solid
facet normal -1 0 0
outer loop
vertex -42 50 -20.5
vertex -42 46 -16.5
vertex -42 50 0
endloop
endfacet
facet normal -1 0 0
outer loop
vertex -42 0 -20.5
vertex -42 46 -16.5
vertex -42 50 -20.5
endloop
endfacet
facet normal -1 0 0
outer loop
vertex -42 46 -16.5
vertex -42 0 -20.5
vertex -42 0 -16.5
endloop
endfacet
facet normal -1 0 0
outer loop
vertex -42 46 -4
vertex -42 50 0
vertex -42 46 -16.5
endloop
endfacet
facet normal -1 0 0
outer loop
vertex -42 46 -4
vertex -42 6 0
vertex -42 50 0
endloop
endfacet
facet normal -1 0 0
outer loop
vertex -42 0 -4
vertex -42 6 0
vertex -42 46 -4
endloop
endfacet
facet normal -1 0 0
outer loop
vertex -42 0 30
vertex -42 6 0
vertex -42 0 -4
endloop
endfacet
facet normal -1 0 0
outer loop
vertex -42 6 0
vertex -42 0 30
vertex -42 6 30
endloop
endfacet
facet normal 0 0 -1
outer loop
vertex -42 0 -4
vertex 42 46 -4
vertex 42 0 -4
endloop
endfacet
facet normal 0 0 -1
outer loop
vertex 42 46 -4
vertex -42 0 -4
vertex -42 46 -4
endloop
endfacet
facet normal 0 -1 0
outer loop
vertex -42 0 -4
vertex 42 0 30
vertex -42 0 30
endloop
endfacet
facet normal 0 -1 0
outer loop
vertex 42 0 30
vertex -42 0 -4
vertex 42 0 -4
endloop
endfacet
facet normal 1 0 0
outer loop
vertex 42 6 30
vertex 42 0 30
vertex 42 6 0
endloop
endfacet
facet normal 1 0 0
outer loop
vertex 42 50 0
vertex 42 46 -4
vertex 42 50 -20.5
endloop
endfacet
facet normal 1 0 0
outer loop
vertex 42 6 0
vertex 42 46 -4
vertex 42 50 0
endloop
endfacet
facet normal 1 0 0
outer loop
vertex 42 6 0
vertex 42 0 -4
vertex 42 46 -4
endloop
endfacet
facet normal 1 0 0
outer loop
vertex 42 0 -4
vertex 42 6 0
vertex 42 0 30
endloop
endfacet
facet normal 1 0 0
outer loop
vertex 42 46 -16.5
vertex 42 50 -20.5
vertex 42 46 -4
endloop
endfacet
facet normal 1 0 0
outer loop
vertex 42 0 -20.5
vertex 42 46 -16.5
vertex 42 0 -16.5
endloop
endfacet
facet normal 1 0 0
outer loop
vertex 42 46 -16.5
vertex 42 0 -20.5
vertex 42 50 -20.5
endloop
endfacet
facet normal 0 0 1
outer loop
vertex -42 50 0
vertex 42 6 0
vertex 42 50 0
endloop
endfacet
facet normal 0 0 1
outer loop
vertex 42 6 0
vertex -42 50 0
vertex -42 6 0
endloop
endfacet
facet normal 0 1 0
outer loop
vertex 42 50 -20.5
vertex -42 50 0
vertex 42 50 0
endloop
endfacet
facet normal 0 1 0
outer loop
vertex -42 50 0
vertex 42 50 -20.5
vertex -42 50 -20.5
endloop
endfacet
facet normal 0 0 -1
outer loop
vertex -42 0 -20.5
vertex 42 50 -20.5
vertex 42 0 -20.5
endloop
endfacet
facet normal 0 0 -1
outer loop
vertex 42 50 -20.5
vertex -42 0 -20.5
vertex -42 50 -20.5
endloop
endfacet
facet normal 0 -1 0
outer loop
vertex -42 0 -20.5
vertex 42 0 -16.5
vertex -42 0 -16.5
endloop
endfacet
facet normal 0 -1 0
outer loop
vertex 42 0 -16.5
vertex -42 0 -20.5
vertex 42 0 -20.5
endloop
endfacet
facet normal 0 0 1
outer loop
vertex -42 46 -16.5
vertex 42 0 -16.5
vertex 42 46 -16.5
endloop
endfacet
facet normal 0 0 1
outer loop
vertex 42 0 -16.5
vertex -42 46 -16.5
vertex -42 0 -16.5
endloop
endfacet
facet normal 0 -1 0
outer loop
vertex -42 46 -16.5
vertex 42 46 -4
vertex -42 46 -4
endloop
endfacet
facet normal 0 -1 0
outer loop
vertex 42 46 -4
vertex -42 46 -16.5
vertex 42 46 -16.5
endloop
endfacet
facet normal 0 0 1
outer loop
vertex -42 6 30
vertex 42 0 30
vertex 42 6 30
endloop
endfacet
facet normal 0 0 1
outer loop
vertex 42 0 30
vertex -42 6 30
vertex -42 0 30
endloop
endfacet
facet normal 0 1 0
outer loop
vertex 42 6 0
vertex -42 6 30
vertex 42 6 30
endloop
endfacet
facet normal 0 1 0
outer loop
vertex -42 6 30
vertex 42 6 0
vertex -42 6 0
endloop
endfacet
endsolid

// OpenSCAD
// 8-tube PCR strip holder that hooks over a 12 mm ice-bucket wall.
// Printed as used: rests on the XY plane at z = 0, builds upward (+Z), centred on x = 0.
// The part is a profile in the YZ plane extruded 84 mm along X.
// We build the profile in the XY plane (x = Y, y = Z) and extrude along Z,
// then rotate 90 deg about Y so the extrusion axis becomes X and Z stays Z.

$fn = 64;

// ---- Dimensions (mm) ----
extrude_x   = 84;    // length of the part along X

// Upside-down U profile (Y = horizontal, Z = vertical)
inner_leg_y0 = 0;    // inner face of inner leg
inner_leg_y1 = 4;    // outer face of inner leg (wall 12 mm -> 12.5 mm gap)
outer_leg_y0 = 16.5; // inner face of outer leg
outer_leg_y1 = 20.5; // outer face of outer leg
leg_z0       = 0;    // bottom of both legs
leg_z1       = 50;   // top of both legs
bridge_z0    = 46;   // bottom of top bridge
bridge_z1    = 50;   // top of top bridge
// gap between inner and outer legs = 16.5 - 4 = 12.5 mm (clears 12 mm wall)

// Flat ledge reaching into the ice
ledge_y0     = -30;  // far end of ledge (toward -Y)
ledge_y1     = 0;    // meets the foot of the inner leg
ledge_z0     = 0;    // bottom of ledge
ledge_z1     = 6;    // top of ledge (6 mm thick)

// Tube holes
hole_d       = 6.4;  // through-hole diameter
hole_pitch   = 9;    // spacing along X
hole_y       = -15;  // hole centre in Y
hole_z0      = -1;   // extend below z = 0
hole_z1      = 7;    // extend above ledge top (6)

// ---- Build the part ----
module part() {
    rotate([0, 90, 0]) {   // extrusion axis (Z) -> X ; profile y (Z) -> Z
        difference() {
            union() {
                // Inner leg (profile in XY: x = Y, y = Z)
                linear_extrude(height = extrude_x, center = true) {
                    polygon(points = [
                        [inner_leg_y0, leg_z0],
                        [inner_leg_y1, leg_z0],
                        [inner_leg_y1, leg_z1],
                        [inner_leg_y0, leg_z1]
                    ]);
                }
                // Outer leg
                linear_extrude(height = extrude_x, center = true) {
                    polygon(points = [
                        [outer_leg_y0, leg_z0],
                        [outer_leg_y1, leg_z0],
                        [outer_leg_y1, leg_z1],
                        [outer_leg_y0, leg_z1]
                    ]);
                }
                // Top bridge spanning the 12.5 mm gap
                linear_extrude(height = extrude_x, center = true) {
                    polygon(points = [
                        [inner_leg_y1, bridge_z0],
                        [outer_leg_y0, bridge_z0],
                        [outer_leg_y0, bridge_z1],
                        [inner_leg_y1, bridge_z1]
                    ]);
                }
                // Flat ledge reaching toward -Y from the foot of the inner leg
                linear_extrude(height = extrude_x, center = true) {
                    polygon(points = [
                        [ledge_y0, ledge_z0],
                        [ledge_y1, ledge_z0],
                        [ledge_y1, ledge_z1],
                        [ledge_y0, ledge_z1]
                    ]);
                }
            }

            // Eight vertical 6.4 mm through-holes in the ledge, 9 mm apart along X, centred
            for (i = [-3, -2, -1, 0, 1, 2, 3, 4]) {
                x_pos = -31.5 + i * hole_pitch;   // -31.5 .. +31.5, centred on x = 0
                translate([x_pos, hole_y, 0]) {
                    cylinder(h = hole_z1 - hole_z0, r = hole_d / 2, center = false);
                }
            }
        }
    }
}

part();
